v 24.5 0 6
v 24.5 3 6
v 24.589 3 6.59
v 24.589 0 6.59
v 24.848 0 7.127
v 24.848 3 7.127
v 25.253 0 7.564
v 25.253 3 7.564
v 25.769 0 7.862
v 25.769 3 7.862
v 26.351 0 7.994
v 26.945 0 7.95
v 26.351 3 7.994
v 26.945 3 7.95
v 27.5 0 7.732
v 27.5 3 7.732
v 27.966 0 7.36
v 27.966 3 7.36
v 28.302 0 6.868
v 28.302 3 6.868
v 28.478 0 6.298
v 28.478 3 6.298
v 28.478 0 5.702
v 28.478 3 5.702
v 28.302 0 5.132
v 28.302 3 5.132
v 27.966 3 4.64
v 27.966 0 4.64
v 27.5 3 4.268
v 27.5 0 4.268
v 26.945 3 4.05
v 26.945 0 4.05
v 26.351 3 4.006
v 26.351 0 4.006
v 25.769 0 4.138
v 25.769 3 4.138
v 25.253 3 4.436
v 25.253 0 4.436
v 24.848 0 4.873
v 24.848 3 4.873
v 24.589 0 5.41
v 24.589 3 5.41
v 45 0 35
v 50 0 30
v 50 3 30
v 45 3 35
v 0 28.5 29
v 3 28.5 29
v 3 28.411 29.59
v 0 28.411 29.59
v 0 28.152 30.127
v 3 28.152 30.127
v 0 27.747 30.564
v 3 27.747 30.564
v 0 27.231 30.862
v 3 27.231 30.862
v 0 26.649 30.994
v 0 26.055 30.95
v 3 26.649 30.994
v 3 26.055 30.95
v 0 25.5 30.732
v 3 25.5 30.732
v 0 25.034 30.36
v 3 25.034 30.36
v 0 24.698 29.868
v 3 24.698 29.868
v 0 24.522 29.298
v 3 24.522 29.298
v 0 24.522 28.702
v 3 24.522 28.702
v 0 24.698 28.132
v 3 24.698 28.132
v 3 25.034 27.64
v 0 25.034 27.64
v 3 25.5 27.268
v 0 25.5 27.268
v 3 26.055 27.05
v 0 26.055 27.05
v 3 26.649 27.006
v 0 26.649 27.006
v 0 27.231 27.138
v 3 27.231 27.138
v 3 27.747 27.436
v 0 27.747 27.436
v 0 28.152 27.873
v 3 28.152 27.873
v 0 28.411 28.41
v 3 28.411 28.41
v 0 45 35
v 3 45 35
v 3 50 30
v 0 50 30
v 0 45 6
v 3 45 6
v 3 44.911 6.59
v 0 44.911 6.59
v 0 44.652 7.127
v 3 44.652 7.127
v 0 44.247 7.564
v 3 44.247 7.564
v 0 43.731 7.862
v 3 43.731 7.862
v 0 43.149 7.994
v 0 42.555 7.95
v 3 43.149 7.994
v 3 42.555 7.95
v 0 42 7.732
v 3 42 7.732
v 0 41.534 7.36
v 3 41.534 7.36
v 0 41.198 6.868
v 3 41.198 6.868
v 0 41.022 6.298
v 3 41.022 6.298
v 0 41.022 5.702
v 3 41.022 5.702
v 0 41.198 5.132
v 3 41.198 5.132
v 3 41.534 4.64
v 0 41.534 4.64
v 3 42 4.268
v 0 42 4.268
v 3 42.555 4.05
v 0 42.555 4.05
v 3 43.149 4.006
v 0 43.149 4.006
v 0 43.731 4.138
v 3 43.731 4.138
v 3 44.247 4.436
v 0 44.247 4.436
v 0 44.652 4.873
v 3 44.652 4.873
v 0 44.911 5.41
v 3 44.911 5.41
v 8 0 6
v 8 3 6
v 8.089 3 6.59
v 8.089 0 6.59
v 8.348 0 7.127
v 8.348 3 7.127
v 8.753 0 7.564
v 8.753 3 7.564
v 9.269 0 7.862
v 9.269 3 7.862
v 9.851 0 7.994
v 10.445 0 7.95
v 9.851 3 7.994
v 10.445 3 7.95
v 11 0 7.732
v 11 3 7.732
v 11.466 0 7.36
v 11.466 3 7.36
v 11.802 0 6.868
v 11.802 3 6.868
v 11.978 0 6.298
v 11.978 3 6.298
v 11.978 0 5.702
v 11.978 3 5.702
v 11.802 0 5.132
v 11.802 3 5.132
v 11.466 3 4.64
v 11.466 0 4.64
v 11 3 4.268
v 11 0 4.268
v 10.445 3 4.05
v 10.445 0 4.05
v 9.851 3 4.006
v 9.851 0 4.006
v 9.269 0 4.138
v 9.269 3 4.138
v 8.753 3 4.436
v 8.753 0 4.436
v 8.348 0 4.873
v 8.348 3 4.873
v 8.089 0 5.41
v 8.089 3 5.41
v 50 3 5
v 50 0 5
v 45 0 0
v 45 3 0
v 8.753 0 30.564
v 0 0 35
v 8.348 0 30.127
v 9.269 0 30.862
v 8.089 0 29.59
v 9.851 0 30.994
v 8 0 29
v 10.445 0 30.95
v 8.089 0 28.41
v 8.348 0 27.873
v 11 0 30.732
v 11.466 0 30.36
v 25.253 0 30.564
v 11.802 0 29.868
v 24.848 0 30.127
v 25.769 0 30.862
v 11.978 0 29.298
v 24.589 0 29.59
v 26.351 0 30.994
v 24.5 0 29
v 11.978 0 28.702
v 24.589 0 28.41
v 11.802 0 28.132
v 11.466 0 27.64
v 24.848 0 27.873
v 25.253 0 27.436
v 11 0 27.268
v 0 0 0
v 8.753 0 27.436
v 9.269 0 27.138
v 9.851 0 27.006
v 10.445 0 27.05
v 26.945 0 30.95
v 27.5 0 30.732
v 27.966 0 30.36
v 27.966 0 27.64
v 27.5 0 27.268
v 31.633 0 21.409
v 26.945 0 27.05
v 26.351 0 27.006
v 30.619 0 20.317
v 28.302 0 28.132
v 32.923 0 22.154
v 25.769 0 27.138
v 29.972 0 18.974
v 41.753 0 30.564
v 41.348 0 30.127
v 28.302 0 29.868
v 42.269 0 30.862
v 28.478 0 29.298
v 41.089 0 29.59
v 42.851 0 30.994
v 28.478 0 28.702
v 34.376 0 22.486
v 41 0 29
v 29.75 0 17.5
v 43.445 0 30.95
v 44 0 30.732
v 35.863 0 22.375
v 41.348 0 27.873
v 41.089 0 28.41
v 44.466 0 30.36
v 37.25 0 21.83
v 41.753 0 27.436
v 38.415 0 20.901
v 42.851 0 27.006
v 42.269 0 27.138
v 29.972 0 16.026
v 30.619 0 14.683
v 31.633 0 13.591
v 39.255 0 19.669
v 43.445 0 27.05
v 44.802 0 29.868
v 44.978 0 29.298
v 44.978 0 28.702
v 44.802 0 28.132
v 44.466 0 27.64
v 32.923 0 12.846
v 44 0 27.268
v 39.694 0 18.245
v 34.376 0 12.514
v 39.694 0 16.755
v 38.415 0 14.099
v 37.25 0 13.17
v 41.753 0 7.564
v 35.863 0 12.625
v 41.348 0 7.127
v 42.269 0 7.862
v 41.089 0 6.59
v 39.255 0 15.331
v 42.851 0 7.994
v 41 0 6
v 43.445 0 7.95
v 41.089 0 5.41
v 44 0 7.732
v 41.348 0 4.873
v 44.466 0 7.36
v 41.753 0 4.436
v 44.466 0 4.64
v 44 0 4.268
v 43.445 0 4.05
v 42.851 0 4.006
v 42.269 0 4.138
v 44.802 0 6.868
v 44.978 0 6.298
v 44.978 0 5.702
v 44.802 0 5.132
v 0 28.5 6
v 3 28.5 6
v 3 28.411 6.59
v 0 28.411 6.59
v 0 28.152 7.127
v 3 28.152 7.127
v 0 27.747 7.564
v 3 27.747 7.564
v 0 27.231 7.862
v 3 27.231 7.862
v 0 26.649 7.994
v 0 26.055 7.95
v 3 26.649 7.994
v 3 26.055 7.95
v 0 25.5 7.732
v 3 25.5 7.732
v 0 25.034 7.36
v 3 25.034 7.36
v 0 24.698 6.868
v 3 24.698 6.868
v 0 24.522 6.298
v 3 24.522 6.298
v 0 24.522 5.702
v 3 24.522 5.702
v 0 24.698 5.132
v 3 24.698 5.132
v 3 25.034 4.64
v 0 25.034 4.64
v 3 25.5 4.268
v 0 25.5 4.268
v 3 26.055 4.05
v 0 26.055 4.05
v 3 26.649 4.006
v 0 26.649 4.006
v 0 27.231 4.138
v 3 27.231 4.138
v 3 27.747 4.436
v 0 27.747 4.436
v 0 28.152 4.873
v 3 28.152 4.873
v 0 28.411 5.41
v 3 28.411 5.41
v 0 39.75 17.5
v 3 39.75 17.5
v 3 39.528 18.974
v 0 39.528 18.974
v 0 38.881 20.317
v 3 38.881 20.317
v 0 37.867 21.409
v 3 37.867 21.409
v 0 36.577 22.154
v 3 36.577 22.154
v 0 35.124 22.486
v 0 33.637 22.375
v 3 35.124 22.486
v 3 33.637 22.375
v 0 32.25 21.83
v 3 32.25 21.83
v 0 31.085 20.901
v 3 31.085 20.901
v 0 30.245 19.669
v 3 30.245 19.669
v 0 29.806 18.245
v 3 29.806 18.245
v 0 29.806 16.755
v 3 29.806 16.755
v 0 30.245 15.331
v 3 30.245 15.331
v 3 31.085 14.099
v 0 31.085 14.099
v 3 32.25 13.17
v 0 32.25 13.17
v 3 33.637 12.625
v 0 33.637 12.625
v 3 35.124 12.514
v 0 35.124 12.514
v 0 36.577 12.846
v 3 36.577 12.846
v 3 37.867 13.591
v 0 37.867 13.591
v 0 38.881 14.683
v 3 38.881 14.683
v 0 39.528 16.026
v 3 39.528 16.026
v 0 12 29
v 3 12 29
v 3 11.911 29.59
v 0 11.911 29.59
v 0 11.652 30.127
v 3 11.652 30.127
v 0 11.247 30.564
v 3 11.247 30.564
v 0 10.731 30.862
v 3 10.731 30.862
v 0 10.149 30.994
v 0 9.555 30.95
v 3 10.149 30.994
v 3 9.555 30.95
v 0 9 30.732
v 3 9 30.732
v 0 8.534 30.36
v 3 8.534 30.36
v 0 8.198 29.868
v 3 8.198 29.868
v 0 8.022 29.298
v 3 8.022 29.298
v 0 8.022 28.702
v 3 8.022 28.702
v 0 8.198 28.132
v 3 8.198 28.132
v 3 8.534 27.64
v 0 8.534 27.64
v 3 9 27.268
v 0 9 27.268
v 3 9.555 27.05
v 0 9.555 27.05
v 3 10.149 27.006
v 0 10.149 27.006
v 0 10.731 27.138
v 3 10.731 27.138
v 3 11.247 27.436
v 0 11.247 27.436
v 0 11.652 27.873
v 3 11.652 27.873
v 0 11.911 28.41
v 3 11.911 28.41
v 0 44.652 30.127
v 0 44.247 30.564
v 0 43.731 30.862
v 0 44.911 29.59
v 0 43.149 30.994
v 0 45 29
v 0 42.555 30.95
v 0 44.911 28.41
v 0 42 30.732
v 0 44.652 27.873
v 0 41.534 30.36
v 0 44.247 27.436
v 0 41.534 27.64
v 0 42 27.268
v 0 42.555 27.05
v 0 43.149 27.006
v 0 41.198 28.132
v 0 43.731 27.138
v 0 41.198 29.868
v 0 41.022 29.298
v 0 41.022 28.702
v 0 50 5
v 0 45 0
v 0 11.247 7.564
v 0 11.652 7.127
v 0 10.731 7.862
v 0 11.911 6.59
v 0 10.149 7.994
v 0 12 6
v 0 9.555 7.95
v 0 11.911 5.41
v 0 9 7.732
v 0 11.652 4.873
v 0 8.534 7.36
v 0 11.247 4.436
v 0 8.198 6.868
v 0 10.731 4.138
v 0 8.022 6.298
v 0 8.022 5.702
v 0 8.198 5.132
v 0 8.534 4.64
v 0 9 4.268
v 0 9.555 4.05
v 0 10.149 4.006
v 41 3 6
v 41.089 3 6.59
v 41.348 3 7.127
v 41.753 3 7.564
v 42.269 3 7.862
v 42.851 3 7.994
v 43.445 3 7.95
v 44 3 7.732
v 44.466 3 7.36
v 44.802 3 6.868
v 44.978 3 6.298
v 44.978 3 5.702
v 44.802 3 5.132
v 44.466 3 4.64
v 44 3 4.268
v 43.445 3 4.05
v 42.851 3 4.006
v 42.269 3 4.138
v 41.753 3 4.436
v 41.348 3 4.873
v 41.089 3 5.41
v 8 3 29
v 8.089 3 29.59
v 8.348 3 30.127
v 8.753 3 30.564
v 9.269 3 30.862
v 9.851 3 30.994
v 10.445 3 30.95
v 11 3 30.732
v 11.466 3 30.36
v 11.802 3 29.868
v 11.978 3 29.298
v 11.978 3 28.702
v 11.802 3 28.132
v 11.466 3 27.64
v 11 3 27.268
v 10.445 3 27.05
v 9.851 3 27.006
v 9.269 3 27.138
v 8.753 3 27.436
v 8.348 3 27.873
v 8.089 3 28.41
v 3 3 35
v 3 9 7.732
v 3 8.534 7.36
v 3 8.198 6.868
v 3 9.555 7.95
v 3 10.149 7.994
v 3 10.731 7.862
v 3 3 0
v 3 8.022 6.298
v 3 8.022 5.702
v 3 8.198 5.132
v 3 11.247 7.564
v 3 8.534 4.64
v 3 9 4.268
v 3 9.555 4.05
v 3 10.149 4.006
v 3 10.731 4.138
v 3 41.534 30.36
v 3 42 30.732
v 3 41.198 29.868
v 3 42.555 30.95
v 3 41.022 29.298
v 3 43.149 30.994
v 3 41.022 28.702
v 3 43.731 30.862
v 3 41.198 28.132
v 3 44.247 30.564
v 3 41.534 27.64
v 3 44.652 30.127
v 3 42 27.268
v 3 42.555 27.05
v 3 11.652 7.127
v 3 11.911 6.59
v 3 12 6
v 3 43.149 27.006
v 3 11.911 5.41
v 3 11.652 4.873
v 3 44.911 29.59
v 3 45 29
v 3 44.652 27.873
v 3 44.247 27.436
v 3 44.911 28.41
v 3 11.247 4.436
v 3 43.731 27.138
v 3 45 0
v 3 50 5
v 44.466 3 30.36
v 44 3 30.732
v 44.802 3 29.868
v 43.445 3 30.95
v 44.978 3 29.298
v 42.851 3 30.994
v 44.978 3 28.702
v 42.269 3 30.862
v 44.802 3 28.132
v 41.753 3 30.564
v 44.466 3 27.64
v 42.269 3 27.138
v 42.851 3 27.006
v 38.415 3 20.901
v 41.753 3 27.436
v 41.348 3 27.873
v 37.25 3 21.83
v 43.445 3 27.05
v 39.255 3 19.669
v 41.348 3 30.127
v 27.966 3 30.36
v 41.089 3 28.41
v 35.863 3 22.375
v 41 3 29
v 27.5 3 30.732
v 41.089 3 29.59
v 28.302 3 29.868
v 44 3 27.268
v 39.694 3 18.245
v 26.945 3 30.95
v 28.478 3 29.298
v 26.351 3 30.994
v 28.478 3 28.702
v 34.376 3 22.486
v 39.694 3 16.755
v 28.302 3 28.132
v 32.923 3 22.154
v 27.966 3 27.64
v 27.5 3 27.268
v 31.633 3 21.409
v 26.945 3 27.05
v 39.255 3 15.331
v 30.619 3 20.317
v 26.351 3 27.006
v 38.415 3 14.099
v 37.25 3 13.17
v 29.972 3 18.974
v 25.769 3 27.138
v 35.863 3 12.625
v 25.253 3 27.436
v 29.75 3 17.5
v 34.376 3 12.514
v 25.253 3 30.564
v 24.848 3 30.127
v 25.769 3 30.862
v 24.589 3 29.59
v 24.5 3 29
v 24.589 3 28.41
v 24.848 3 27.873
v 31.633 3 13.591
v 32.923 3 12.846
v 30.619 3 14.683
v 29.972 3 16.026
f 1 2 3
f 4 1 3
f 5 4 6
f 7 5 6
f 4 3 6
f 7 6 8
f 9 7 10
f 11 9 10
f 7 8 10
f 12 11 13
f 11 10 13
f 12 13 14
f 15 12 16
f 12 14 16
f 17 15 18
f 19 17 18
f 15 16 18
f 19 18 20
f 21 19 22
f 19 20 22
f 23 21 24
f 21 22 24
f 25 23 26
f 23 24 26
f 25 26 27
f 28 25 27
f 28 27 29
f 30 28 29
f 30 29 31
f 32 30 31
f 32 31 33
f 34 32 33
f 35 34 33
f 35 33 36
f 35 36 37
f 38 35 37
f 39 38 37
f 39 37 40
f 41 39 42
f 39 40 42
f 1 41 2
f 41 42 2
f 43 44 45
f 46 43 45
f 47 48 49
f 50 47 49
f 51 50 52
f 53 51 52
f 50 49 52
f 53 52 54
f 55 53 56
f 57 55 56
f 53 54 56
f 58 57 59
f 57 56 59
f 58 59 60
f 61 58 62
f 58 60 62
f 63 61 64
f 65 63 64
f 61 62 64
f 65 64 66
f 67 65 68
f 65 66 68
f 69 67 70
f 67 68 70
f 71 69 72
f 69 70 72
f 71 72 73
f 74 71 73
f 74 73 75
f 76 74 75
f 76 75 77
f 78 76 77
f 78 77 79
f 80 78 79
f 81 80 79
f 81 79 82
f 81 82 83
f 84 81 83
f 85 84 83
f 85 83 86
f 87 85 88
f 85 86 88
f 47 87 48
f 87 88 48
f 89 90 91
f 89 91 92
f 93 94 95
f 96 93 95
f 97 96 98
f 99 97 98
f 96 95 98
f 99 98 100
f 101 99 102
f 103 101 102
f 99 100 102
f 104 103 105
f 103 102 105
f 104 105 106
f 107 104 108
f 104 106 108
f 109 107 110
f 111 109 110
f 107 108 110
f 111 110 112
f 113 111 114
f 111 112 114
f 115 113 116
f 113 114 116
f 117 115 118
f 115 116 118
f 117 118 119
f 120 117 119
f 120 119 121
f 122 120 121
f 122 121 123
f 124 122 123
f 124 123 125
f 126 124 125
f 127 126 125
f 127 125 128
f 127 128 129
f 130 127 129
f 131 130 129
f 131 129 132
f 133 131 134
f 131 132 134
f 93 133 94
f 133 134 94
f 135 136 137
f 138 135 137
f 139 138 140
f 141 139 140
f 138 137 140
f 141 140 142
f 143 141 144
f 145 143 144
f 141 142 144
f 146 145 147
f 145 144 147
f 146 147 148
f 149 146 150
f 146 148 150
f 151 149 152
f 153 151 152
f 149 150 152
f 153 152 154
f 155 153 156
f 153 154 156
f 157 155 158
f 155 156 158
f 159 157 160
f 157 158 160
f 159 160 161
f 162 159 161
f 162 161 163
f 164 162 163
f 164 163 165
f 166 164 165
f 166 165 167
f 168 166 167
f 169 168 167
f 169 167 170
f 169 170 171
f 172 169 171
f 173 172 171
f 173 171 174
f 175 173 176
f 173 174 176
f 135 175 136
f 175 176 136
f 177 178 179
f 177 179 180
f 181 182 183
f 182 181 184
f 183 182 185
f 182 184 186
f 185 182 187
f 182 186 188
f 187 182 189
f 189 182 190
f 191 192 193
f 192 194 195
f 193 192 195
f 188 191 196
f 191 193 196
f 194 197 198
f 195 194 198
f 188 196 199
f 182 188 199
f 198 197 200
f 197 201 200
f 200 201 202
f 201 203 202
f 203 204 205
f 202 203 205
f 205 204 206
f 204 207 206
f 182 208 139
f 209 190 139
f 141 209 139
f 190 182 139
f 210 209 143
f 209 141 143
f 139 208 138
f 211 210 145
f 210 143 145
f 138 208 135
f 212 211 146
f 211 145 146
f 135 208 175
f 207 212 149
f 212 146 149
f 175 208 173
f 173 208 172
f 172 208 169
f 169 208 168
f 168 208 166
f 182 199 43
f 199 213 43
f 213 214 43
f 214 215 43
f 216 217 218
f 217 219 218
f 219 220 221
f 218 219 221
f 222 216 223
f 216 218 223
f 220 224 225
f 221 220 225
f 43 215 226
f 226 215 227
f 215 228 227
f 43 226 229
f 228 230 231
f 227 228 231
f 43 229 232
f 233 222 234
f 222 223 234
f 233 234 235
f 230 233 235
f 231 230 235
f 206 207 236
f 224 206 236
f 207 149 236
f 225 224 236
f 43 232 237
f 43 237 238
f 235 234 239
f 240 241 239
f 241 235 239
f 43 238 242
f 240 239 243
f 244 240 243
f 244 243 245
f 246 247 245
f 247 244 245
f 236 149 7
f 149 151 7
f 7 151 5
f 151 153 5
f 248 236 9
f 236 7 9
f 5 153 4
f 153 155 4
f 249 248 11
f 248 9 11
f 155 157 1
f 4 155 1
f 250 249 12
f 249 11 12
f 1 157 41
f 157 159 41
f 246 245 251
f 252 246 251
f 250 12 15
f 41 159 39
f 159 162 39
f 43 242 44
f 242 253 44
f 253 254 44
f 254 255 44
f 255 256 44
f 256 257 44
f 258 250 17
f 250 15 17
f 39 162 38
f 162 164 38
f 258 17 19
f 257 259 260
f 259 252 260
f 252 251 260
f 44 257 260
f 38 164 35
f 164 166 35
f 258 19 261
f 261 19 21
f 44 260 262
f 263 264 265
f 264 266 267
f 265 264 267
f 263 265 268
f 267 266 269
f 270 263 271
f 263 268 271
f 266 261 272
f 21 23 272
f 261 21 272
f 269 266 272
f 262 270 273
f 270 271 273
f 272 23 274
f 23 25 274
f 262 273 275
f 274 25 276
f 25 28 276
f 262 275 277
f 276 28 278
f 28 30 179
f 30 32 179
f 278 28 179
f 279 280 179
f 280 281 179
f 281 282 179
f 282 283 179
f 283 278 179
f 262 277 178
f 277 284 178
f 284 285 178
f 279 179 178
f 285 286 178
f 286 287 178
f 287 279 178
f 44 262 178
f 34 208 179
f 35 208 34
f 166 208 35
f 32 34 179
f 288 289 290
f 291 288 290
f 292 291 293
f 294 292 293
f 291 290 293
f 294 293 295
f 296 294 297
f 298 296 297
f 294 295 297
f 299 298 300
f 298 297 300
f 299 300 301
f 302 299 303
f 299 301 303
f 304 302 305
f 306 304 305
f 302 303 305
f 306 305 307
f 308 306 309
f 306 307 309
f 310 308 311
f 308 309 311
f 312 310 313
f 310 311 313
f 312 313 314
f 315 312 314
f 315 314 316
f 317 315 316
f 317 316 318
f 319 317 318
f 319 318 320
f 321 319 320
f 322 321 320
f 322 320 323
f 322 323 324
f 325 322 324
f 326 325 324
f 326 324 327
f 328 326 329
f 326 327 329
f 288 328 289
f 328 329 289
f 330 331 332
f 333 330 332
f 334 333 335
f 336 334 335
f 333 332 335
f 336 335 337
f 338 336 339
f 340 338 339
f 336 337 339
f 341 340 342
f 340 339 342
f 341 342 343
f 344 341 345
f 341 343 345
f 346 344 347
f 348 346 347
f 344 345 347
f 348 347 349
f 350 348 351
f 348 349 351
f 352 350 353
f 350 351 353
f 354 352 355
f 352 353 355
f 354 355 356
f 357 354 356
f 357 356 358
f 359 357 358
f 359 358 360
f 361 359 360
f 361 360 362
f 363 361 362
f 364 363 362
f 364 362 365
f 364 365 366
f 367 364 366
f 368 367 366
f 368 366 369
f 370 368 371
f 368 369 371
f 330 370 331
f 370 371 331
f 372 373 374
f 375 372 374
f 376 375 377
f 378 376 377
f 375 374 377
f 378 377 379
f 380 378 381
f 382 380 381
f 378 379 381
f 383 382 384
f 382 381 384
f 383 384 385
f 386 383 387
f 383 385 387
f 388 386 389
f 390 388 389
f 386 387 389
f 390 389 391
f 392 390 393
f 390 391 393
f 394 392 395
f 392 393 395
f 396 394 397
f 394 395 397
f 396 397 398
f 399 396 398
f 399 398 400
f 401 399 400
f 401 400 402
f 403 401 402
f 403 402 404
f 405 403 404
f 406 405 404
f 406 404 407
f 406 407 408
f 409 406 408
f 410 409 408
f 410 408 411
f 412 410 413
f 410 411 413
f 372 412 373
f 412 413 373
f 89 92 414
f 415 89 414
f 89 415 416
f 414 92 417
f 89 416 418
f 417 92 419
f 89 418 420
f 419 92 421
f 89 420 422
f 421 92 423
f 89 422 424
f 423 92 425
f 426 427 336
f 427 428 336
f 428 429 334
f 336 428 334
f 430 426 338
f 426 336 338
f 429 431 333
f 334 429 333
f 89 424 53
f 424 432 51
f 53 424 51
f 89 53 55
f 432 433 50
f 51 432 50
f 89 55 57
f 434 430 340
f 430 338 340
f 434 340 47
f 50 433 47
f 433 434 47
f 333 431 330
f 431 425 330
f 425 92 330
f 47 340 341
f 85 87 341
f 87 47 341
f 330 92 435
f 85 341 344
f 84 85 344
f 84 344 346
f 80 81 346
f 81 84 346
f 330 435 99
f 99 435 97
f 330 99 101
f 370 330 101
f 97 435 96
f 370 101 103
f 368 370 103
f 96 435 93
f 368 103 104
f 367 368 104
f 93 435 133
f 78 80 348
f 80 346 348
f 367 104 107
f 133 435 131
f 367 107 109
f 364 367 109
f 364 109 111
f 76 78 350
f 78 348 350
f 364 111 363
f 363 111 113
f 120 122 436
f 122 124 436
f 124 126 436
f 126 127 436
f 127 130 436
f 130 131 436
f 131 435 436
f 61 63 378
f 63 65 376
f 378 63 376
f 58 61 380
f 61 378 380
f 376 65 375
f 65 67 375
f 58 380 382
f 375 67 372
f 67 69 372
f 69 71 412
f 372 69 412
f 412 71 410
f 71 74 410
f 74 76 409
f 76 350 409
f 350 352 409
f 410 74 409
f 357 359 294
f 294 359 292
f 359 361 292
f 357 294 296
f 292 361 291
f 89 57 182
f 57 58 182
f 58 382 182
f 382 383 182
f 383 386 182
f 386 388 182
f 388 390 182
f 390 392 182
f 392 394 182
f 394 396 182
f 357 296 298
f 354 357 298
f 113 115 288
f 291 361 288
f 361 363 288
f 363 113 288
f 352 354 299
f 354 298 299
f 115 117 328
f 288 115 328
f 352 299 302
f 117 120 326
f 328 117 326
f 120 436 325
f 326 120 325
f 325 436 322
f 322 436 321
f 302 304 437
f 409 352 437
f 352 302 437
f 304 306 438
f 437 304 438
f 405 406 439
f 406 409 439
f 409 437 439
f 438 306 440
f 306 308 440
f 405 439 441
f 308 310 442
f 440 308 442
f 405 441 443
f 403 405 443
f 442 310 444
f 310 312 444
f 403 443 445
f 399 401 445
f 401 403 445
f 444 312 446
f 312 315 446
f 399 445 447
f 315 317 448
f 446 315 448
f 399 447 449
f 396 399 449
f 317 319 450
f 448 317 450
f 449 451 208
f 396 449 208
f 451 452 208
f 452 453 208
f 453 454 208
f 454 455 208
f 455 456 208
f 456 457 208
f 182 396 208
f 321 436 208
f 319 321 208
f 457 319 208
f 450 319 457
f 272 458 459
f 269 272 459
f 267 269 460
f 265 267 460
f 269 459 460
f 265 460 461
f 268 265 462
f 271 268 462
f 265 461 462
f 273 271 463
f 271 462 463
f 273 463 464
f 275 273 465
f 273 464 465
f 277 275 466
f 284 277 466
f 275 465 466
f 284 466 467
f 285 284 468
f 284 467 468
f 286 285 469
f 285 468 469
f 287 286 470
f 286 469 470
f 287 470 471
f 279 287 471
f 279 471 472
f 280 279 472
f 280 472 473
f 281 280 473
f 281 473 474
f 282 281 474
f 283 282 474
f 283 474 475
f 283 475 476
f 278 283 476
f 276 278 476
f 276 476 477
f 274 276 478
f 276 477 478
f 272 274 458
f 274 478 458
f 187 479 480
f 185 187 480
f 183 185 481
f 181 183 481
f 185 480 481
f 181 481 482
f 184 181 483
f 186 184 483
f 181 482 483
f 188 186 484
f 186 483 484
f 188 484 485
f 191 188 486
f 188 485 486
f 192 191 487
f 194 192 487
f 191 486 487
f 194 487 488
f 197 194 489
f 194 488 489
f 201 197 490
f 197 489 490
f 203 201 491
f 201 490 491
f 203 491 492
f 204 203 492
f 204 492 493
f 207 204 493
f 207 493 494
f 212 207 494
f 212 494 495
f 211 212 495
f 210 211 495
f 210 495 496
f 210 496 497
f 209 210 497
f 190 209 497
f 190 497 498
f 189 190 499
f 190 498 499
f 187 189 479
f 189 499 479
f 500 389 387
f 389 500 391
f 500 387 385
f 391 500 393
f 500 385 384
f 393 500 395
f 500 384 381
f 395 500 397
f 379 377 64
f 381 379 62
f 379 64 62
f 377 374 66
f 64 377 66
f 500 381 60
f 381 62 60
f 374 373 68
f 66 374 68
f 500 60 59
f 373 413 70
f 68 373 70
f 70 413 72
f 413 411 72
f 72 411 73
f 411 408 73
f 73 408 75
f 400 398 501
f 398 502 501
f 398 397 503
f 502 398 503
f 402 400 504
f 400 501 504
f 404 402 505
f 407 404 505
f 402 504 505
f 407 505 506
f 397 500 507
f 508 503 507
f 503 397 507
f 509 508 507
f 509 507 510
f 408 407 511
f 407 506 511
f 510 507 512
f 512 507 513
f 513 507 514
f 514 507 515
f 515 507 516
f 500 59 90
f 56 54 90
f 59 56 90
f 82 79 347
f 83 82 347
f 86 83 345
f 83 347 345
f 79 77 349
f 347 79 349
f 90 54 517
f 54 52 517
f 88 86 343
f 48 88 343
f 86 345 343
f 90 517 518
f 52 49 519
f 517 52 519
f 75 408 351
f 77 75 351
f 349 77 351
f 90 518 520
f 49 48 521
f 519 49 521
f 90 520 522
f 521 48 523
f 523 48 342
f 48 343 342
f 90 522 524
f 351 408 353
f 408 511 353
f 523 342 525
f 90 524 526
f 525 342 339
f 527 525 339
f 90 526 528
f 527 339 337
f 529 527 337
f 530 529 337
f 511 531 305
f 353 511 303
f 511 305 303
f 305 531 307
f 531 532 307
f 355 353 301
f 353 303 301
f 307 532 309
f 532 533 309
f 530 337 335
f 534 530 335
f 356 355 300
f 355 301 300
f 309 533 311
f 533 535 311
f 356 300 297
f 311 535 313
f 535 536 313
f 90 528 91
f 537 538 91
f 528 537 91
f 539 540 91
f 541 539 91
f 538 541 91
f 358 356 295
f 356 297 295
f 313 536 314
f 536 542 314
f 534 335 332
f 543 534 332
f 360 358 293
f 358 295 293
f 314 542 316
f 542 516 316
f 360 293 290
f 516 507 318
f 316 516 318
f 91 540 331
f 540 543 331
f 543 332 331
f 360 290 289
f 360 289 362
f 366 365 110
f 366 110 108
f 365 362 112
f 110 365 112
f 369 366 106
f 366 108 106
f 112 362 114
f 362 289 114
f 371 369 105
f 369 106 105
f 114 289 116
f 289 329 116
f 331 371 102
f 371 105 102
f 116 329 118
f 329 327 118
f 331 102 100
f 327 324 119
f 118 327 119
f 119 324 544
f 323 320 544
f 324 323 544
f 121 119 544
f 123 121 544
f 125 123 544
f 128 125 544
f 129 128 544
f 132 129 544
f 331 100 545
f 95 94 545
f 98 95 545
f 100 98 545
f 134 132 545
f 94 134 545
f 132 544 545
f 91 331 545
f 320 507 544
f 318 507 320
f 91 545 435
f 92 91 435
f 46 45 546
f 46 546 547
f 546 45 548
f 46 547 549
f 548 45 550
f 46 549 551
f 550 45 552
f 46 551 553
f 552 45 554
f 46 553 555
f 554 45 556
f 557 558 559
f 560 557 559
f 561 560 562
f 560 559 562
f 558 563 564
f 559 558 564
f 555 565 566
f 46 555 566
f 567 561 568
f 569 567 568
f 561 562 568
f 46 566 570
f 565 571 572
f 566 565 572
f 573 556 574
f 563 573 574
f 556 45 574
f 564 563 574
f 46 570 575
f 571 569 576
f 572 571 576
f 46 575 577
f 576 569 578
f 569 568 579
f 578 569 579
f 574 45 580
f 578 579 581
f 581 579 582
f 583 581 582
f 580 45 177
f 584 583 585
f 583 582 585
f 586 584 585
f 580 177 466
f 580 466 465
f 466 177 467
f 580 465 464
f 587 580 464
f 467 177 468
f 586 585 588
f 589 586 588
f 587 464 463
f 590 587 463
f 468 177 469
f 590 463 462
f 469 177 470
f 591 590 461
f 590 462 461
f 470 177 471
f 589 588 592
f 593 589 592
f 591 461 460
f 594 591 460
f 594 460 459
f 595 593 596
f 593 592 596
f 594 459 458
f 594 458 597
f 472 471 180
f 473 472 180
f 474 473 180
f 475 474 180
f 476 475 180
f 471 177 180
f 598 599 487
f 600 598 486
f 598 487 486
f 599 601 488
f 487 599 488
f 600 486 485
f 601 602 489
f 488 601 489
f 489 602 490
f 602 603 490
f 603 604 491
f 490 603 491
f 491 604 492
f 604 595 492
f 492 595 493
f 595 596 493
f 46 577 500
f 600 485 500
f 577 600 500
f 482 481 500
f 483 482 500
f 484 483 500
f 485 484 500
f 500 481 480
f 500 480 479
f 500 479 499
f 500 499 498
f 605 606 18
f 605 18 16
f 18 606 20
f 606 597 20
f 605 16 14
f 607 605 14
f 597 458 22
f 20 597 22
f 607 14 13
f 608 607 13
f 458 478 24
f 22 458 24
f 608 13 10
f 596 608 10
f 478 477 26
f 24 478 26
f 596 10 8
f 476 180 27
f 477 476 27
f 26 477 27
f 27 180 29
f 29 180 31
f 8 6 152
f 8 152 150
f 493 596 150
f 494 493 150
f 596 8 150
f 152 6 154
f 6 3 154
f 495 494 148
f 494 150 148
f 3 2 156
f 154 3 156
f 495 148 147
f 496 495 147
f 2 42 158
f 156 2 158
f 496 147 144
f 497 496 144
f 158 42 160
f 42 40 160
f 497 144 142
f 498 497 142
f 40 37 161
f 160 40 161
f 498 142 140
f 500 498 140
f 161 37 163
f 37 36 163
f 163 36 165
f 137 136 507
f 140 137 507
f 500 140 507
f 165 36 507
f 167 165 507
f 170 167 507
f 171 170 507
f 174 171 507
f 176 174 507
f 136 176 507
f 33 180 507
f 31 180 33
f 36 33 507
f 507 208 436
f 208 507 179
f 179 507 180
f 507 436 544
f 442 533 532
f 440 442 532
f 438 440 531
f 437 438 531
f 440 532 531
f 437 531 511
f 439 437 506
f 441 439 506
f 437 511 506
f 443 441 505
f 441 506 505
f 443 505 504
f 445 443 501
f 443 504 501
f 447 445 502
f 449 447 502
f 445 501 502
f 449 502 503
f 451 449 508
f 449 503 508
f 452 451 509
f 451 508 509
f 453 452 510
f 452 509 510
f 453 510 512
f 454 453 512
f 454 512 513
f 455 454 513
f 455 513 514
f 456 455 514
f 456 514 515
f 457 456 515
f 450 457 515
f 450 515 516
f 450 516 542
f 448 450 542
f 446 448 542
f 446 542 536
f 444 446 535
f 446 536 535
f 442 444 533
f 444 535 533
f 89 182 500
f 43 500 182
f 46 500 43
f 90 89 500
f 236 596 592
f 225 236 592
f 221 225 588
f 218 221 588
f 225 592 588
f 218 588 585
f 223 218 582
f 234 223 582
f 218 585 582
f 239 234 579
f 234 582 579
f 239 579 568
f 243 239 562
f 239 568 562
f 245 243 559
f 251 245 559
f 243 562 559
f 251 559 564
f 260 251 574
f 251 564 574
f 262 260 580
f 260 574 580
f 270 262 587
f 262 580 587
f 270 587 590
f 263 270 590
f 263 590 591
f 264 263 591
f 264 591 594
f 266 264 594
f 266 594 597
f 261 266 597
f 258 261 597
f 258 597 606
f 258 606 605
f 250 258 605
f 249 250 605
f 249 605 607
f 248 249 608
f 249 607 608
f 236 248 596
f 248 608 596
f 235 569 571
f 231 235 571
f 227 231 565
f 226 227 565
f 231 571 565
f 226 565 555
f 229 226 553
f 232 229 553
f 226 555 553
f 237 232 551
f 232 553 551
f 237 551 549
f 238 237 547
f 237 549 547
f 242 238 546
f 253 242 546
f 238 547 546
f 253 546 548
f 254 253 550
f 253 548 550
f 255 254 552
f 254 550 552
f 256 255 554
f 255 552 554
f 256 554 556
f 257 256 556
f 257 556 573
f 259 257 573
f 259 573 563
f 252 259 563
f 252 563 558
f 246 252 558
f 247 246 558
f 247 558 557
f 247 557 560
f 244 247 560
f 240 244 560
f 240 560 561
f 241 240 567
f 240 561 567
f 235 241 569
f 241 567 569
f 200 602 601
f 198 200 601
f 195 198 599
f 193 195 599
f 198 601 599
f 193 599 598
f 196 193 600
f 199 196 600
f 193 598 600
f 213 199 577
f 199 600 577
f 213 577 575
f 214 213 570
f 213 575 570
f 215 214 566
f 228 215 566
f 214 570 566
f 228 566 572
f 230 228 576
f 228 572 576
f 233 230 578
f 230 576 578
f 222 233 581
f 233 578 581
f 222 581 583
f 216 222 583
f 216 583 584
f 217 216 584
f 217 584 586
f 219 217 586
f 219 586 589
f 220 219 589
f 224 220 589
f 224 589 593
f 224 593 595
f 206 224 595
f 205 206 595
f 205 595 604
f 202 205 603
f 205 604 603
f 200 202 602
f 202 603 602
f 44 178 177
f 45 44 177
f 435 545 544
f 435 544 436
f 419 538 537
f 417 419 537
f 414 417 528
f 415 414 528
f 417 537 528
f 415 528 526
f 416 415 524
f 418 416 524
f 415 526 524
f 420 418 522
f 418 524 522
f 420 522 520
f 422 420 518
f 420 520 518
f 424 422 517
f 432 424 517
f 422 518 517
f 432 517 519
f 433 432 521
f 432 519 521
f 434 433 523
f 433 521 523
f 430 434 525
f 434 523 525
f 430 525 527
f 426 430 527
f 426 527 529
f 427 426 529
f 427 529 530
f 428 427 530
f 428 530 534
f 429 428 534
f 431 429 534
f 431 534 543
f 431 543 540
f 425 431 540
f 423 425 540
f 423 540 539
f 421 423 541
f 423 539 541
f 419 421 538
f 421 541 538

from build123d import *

# Parameters (mm, degrees)
F1_DEPTH = 35
F2_R     = 5
F2_R_2   = 2
F3_DEPTH = 3
F4_R     = 5
F4_R_2   = 2
F5_DEPTH = 3
F6_SIZE  = 5
F7_SIZE  = 5


with BuildPart() as f1:
    # F0 (on Top) → F1 (new body)
    with BuildSketch(Plane.XY):
        Polygon((0, 50), (0, 0), (50, 0), (50, 3), (3, 3), (3, 50), align=None)
    extrude(amount=F1_DEPTH)

    # F2 (on face) → F3 (cut, through all)
    with BuildSketch(Plane(origin=(0, 3, 0), x_dir=(-1, 0, 0), z_dir=(0, 1, 0))):
        with Locations((-34.75, 17.5)):
            Circle(F2_R)
        with Locations((-43, 29)):
            Circle(F2_R_2)
        with Locations((-26.5, 29)):
            Circle(F2_R_2)
        with Locations((-10, 29)):
            Circle(F2_R_2)
        with Locations((-43, 6)):
            Circle(F2_R_2)
        with Locations((-26.5, 6)):
            Circle(F2_R_2)
        with Locations((-10, 6)):
            Circle(F2_R_2)
    extrude(amount=-F3_DEPTH, mode=Mode.SUBTRACT)

    # F4 (on face) → F5 (cut, through all)
    with BuildSketch(Plane.YZ.offset(3)):
        with Locations((34.75, 17.5)):
            Circle(F4_R)
        with Locations((10, 29)):
            Circle(F4_R_2)
        with Locations((26.5, 29)):
            Circle(F4_R_2)
        with Locations((43, 29)):
            Circle(F4_R_2)
        with Locations((10, 6)):
            Circle(F4_R_2)
        with Locations((26.5, 6)):
            Circle(F4_R_2)
        with Locations((43, 6)):
            Circle(F4_R_2)
    extrude(amount=-F5_DEPTH, mode=Mode.SUBTRACT)

    # F6
    f6_edges = [f1.edges().sort_by_distance(p)[0] for p in [
        (50, 1.5, 35),
        (50, 1.5, 0),
    ]]
    chamfer(f6_edges, length=F6_SIZE)

    # F7
    f7_edges = [f1.edges().sort_by_distance(p)[0] for p in [
        (1.5, 50, 35),
        (1.5, 50, 0),
    ]]
    chamfer(f7_edges, length=F7_SIZE)


solid = f1.part
